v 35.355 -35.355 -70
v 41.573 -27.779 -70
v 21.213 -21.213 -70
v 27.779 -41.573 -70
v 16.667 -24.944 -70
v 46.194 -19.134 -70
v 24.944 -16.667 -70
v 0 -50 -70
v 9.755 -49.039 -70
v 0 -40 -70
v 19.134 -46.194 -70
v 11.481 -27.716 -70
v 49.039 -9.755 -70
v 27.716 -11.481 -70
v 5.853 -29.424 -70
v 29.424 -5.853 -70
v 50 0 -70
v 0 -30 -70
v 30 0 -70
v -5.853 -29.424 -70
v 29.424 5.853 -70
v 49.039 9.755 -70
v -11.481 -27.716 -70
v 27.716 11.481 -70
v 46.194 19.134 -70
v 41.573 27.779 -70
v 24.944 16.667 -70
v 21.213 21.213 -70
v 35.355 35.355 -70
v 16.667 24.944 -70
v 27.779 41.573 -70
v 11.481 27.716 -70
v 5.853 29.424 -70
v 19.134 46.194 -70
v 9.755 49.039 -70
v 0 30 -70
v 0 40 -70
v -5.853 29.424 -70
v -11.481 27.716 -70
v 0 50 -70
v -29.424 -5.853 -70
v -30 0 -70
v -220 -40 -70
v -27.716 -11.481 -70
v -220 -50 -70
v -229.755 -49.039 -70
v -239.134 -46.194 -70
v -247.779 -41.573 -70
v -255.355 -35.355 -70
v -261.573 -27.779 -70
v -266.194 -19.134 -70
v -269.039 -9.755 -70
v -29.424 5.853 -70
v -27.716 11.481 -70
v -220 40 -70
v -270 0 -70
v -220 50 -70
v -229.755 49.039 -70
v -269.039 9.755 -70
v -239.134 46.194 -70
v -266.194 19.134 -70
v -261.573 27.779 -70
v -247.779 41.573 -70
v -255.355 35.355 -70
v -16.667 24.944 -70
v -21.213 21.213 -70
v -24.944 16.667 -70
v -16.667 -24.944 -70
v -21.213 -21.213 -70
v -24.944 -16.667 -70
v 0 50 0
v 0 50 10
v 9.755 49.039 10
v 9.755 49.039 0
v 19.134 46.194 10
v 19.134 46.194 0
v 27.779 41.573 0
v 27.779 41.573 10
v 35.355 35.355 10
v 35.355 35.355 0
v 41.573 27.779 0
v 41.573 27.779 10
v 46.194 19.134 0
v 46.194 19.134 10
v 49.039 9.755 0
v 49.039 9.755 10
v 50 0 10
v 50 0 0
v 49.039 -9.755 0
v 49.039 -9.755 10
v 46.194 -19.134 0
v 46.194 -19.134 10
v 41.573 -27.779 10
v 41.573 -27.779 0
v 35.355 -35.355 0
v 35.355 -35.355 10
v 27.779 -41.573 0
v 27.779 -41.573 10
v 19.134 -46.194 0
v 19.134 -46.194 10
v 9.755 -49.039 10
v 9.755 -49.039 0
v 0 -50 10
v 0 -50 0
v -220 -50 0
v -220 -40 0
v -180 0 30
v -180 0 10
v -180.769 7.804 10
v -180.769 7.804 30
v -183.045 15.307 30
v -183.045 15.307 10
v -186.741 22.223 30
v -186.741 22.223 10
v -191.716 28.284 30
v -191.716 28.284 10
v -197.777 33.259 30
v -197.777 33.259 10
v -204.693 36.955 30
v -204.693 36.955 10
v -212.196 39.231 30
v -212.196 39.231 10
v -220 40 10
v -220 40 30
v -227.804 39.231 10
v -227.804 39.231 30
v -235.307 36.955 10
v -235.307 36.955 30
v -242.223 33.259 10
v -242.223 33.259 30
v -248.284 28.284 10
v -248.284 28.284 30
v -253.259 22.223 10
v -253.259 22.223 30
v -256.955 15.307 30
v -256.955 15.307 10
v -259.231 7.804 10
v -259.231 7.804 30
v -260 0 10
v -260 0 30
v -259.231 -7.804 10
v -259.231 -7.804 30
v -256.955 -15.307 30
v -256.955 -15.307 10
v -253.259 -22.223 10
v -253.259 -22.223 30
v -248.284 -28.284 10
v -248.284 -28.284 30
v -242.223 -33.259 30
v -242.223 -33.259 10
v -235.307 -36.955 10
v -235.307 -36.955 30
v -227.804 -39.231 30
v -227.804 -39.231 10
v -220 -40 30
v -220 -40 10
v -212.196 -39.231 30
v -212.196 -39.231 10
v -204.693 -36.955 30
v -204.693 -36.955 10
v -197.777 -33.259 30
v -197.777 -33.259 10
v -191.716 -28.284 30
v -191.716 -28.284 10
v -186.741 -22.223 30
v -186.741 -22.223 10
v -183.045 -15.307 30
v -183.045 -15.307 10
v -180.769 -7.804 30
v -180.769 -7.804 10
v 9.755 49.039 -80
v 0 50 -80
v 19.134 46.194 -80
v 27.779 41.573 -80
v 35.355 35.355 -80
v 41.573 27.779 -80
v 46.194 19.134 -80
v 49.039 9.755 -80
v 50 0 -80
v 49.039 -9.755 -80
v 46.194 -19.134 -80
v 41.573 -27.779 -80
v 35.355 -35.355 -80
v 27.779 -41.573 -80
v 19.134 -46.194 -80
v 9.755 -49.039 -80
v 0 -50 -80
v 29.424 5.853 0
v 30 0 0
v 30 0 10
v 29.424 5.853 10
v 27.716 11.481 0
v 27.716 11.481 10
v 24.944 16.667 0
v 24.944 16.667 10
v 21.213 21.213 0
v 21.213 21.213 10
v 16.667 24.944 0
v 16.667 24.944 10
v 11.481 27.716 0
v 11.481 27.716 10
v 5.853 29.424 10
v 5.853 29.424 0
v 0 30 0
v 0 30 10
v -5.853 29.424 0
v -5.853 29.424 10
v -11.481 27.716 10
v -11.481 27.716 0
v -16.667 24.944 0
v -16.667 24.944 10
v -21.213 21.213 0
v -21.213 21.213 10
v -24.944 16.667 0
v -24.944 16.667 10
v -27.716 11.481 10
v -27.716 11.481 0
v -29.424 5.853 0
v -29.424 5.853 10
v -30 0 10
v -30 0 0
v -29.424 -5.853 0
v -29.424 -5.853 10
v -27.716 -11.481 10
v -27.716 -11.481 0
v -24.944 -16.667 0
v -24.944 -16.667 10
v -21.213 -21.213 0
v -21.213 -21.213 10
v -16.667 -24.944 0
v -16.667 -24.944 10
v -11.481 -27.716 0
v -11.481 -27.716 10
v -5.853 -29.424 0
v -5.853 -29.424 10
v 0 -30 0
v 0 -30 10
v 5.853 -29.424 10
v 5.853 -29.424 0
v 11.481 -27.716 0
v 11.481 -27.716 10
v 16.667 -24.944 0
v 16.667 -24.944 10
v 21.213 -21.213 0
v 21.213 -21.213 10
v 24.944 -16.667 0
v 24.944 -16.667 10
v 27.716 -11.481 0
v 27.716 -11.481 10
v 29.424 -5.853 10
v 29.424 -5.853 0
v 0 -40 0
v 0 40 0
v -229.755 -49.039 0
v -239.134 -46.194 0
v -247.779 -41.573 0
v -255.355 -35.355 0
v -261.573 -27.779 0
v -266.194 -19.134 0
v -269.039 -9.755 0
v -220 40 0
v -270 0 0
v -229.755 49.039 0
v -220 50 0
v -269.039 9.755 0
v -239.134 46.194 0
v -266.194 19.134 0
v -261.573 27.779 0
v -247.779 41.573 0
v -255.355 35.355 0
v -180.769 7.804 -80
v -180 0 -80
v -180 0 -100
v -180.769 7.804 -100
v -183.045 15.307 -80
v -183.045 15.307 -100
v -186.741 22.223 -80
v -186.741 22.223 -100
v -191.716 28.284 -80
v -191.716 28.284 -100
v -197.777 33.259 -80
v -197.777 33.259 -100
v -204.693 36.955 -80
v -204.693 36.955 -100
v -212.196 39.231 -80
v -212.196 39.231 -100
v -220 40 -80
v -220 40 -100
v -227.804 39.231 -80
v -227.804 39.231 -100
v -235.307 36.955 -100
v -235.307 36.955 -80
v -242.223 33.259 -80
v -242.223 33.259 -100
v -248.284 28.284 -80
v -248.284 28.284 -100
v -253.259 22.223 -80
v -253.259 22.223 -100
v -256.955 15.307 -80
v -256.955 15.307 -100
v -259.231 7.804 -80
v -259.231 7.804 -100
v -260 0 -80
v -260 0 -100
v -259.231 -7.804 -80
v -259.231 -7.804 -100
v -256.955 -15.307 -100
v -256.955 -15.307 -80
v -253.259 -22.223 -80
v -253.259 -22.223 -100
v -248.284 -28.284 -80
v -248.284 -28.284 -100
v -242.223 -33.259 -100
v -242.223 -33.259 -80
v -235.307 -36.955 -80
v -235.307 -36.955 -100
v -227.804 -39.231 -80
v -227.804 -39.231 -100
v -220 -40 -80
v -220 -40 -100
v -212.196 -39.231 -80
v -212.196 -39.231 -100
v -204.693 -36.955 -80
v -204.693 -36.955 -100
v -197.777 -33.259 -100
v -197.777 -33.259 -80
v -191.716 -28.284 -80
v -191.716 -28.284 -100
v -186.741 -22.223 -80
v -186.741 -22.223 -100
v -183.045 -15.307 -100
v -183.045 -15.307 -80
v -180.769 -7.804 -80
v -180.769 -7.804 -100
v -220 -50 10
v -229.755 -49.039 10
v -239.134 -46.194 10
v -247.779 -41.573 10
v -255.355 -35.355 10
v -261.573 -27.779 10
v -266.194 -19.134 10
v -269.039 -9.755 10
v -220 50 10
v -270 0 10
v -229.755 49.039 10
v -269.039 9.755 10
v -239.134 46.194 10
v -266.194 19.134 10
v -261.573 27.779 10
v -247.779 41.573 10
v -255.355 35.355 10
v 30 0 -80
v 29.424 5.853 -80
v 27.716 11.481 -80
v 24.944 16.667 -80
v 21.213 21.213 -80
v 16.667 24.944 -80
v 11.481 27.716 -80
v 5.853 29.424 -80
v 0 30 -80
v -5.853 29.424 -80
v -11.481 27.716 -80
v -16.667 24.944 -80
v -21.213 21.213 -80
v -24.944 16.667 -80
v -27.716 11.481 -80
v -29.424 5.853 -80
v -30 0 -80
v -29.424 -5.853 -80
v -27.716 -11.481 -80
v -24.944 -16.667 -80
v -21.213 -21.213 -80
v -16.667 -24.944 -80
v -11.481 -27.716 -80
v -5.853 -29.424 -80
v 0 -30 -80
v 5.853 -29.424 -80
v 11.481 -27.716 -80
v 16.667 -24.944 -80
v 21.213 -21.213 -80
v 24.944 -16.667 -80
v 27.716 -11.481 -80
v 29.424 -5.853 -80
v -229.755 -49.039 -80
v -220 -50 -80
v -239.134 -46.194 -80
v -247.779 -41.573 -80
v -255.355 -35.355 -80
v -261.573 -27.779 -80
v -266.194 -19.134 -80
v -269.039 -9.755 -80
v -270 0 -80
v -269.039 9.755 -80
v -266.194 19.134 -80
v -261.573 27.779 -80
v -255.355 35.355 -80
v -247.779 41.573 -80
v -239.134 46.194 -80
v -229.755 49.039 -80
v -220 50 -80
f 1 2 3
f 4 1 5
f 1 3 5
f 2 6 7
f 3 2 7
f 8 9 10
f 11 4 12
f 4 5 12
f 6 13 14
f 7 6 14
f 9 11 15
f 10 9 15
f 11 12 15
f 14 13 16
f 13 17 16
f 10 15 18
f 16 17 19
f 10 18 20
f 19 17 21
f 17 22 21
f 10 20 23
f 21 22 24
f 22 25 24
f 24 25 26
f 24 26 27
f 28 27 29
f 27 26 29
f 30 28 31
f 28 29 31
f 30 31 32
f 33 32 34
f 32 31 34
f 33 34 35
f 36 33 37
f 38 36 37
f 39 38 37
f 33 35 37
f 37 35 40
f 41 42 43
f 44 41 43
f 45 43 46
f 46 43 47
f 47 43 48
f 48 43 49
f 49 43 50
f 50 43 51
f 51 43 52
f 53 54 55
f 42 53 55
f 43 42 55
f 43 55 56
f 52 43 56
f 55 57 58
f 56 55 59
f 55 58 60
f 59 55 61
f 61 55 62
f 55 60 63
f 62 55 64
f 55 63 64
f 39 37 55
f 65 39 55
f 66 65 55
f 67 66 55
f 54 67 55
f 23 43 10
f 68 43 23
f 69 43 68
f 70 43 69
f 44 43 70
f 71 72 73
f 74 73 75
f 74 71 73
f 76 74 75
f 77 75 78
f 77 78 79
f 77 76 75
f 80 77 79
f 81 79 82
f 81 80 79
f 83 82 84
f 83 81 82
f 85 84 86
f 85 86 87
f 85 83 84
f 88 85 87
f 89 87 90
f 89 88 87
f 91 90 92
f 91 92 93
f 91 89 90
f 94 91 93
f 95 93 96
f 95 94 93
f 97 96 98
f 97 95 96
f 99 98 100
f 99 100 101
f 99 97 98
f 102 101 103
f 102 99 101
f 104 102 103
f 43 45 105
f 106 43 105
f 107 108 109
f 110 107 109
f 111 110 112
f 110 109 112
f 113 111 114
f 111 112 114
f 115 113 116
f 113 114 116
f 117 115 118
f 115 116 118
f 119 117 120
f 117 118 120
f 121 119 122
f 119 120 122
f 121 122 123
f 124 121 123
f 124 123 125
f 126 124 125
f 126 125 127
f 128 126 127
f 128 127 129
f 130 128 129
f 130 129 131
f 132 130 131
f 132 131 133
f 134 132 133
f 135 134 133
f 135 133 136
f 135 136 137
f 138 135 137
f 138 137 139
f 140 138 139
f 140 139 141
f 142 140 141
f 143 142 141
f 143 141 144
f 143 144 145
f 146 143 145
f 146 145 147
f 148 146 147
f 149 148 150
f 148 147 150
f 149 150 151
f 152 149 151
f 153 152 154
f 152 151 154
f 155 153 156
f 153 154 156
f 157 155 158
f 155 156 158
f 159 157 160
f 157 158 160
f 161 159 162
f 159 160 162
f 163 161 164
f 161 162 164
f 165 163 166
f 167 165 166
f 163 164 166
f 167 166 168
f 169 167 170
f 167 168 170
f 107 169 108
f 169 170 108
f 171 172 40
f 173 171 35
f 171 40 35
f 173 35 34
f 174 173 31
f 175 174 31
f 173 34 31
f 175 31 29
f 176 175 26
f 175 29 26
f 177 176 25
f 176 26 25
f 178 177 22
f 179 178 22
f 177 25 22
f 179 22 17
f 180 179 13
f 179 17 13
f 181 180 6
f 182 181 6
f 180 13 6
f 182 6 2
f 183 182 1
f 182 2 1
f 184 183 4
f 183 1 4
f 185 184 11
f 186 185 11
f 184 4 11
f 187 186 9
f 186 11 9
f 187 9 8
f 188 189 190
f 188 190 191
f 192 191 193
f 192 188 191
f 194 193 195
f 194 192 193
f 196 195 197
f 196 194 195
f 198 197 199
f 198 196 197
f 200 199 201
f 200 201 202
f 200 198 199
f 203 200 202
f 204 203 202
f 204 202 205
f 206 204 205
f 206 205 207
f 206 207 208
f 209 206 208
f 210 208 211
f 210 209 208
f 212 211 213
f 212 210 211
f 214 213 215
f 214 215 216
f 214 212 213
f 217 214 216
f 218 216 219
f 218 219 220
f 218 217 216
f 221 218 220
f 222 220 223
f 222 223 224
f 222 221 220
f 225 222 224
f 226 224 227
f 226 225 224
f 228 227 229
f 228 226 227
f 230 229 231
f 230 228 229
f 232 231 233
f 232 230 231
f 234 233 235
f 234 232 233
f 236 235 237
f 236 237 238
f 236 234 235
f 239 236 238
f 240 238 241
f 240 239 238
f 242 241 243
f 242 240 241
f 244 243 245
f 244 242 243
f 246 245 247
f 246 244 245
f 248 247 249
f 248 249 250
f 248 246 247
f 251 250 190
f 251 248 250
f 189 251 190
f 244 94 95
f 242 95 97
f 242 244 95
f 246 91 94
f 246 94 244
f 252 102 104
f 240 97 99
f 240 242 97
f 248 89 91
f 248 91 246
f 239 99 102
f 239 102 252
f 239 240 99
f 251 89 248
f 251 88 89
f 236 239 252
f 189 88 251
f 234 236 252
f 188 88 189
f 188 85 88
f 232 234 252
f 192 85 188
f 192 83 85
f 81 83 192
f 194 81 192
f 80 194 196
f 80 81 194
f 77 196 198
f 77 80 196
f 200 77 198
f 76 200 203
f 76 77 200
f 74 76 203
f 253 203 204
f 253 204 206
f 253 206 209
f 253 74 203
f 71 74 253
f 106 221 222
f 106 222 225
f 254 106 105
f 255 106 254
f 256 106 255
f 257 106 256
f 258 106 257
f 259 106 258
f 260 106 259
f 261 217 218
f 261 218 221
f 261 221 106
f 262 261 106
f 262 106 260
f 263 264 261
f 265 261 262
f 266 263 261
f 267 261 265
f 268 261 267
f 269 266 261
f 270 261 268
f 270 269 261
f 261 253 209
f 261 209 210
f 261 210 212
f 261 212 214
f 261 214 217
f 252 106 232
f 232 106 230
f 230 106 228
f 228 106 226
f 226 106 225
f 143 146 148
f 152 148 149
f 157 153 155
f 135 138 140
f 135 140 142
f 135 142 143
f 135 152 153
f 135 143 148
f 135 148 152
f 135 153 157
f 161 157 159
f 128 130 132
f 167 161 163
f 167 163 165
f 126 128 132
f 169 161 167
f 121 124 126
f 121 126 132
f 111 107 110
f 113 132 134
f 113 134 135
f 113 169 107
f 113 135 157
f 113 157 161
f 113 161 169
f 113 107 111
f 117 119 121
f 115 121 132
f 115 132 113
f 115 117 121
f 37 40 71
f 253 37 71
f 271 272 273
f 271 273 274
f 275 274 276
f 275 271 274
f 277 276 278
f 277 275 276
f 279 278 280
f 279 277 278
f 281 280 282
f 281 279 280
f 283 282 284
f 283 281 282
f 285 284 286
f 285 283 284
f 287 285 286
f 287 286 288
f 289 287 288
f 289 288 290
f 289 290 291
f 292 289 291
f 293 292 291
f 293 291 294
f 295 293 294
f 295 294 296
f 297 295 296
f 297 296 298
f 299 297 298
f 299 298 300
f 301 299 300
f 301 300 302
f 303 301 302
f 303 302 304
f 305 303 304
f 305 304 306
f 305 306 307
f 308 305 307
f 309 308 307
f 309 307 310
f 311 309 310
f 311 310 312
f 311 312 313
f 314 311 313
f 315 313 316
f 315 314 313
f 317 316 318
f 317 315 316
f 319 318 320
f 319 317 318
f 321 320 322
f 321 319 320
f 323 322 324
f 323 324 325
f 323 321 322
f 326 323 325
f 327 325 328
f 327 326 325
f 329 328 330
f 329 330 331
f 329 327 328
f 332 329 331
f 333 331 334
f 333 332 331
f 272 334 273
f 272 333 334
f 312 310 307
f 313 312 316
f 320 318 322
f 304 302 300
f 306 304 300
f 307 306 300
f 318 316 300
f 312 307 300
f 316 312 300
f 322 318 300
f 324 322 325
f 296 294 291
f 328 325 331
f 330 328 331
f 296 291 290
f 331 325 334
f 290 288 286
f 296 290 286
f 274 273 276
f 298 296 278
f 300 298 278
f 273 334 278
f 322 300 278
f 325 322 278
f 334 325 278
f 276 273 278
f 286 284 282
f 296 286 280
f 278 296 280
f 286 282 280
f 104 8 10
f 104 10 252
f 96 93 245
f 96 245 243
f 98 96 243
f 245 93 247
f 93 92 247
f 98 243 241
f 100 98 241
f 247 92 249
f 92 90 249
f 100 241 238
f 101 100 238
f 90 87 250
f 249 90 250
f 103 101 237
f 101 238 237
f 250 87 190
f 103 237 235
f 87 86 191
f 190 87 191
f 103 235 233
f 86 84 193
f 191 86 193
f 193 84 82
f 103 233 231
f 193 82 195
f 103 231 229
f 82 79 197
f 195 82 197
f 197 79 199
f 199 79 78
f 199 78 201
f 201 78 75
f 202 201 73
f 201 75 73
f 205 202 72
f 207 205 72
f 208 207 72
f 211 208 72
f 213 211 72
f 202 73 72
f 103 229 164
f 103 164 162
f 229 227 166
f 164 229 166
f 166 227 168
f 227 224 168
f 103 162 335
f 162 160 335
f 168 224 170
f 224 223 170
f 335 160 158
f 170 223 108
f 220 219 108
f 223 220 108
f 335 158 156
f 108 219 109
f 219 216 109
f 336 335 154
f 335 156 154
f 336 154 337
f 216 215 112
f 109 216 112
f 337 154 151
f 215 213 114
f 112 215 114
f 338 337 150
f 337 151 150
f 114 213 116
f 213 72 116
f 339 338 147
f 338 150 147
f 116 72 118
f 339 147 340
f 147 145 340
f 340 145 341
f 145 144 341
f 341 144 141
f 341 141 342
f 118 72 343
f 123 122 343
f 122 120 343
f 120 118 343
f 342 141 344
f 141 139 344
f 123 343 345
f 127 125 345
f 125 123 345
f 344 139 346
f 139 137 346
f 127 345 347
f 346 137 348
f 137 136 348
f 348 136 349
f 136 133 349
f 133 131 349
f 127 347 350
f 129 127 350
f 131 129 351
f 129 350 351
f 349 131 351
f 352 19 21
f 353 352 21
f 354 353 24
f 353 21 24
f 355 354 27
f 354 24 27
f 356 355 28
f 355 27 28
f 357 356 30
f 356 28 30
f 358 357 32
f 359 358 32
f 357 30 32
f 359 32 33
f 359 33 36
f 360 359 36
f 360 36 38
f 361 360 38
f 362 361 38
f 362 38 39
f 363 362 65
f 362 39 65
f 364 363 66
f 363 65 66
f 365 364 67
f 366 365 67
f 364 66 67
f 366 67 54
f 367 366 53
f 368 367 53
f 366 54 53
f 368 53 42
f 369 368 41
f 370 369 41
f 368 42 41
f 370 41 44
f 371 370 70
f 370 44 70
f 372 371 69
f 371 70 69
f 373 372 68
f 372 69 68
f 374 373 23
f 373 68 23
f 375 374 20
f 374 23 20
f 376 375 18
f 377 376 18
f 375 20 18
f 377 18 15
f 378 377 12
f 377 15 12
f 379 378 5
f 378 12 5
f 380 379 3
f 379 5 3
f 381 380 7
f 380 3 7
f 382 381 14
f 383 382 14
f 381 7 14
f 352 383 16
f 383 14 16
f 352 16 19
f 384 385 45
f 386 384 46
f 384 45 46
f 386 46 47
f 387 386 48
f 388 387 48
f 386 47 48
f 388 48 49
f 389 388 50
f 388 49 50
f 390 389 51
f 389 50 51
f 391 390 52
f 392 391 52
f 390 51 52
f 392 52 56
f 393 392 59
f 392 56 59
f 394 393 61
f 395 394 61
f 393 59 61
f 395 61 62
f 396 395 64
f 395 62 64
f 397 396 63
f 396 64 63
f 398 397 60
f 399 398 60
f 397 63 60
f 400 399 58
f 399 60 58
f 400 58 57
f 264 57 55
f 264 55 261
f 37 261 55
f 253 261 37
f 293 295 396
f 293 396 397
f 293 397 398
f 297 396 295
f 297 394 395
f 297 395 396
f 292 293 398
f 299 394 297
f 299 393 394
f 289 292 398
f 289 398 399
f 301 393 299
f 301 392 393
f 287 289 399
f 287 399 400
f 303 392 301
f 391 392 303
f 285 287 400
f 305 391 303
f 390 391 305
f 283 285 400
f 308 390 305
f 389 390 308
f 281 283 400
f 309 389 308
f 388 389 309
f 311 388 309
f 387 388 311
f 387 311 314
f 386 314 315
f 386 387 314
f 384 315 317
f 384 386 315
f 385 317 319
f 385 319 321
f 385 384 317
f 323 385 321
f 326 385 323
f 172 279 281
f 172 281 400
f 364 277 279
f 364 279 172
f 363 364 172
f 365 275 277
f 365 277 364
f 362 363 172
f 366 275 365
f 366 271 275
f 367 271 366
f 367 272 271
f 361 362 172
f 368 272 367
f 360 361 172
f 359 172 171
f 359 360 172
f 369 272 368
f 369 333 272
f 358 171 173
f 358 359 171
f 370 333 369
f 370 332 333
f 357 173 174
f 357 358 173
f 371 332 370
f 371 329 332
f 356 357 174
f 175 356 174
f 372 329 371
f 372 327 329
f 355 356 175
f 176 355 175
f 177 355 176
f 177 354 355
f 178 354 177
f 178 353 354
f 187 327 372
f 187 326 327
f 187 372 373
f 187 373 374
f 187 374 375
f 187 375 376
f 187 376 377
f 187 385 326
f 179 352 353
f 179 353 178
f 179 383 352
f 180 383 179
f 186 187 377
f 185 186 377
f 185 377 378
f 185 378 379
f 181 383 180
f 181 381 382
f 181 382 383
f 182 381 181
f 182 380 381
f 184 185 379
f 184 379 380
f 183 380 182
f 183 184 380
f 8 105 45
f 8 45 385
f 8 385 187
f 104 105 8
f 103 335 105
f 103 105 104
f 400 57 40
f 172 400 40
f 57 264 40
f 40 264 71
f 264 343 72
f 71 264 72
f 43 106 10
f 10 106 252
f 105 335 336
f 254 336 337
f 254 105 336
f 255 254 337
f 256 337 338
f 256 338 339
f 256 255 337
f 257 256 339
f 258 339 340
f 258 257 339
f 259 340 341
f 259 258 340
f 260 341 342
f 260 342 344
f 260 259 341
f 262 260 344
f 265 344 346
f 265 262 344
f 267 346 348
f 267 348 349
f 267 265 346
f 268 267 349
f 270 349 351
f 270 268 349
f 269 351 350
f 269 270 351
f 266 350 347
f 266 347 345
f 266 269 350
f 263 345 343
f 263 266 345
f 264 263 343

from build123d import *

# Parameters (mm, degrees)
SKETCH1_R           = 30
BOSS_EXTRUDE2_DEPTH = 10
SKETCH3_W           = 220
SKETCH3_H           = 80
BOSS_EXTRUDE3_DEPTH = 10
SKETCH4_R           = 40
BOSS_EXTRUDE4_DEPTH = 30


with BuildPart() as part:
    # Sketch1 → Boss-Extrude2 (new body)
    with BuildSketch(Plane.XY):
        with BuildLine():
            Line((0, -50), (-220, -50))
            ThreePointArc((-220, -50), (-270, 0), (-220, 50))
            Line((-220, 50), (0, 50))
            ThreePointArc((0, 50), (50, 0), (0, -50))
        make_face()
        Circle(SKETCH1_R, mode=Mode.SUBTRACT)
    boss_extrude2 = extrude(amount=BOSS_EXTRUDE2_DEPTH)

    # Sketch3 → Boss-Extrude3 (add)
    with BuildSketch(Plane.XZ.offset(50)):
        with Locations((-110, -40)):
            Rectangle(SKETCH3_W, SKETCH3_H)
    boss_extrude3 = extrude(amount=-BOSS_EXTRUDE3_DEPTH)

    # Sketch4 → Boss-Extrude4 (add)
    with BuildSketch(Plane.XY):
        with Locations((-220, 0)):
            Circle(SKETCH4_R)
    boss_extrude4 = extrude(amount=BOSS_EXTRUDE4_DEPTH)

    # Mirror1: Boss-Extrude2, Boss-Extrude3, Boss-Extrude4 across plane
    add(boss_extrude2.mirror(Plane(origin=(0, 0, -35), x_dir=(1, 0, 0), z_dir=(0, 0, -1))))
    add(boss_extrude3.mirror(Plane(origin=(0, 0, -35), x_dir=(1, 0, 0), z_dir=(0, 0, -1))))
    add(boss_extrude4.mirror(Plane(origin=(0, 0, -35), x_dir=(1, 0, 0), z_dir=(0, 0, -1))))

    # Mirror2: Boss-Extrude3 across plane
    add(boss_extrude3.mirror(Plane.ZX))


solid = part.part
